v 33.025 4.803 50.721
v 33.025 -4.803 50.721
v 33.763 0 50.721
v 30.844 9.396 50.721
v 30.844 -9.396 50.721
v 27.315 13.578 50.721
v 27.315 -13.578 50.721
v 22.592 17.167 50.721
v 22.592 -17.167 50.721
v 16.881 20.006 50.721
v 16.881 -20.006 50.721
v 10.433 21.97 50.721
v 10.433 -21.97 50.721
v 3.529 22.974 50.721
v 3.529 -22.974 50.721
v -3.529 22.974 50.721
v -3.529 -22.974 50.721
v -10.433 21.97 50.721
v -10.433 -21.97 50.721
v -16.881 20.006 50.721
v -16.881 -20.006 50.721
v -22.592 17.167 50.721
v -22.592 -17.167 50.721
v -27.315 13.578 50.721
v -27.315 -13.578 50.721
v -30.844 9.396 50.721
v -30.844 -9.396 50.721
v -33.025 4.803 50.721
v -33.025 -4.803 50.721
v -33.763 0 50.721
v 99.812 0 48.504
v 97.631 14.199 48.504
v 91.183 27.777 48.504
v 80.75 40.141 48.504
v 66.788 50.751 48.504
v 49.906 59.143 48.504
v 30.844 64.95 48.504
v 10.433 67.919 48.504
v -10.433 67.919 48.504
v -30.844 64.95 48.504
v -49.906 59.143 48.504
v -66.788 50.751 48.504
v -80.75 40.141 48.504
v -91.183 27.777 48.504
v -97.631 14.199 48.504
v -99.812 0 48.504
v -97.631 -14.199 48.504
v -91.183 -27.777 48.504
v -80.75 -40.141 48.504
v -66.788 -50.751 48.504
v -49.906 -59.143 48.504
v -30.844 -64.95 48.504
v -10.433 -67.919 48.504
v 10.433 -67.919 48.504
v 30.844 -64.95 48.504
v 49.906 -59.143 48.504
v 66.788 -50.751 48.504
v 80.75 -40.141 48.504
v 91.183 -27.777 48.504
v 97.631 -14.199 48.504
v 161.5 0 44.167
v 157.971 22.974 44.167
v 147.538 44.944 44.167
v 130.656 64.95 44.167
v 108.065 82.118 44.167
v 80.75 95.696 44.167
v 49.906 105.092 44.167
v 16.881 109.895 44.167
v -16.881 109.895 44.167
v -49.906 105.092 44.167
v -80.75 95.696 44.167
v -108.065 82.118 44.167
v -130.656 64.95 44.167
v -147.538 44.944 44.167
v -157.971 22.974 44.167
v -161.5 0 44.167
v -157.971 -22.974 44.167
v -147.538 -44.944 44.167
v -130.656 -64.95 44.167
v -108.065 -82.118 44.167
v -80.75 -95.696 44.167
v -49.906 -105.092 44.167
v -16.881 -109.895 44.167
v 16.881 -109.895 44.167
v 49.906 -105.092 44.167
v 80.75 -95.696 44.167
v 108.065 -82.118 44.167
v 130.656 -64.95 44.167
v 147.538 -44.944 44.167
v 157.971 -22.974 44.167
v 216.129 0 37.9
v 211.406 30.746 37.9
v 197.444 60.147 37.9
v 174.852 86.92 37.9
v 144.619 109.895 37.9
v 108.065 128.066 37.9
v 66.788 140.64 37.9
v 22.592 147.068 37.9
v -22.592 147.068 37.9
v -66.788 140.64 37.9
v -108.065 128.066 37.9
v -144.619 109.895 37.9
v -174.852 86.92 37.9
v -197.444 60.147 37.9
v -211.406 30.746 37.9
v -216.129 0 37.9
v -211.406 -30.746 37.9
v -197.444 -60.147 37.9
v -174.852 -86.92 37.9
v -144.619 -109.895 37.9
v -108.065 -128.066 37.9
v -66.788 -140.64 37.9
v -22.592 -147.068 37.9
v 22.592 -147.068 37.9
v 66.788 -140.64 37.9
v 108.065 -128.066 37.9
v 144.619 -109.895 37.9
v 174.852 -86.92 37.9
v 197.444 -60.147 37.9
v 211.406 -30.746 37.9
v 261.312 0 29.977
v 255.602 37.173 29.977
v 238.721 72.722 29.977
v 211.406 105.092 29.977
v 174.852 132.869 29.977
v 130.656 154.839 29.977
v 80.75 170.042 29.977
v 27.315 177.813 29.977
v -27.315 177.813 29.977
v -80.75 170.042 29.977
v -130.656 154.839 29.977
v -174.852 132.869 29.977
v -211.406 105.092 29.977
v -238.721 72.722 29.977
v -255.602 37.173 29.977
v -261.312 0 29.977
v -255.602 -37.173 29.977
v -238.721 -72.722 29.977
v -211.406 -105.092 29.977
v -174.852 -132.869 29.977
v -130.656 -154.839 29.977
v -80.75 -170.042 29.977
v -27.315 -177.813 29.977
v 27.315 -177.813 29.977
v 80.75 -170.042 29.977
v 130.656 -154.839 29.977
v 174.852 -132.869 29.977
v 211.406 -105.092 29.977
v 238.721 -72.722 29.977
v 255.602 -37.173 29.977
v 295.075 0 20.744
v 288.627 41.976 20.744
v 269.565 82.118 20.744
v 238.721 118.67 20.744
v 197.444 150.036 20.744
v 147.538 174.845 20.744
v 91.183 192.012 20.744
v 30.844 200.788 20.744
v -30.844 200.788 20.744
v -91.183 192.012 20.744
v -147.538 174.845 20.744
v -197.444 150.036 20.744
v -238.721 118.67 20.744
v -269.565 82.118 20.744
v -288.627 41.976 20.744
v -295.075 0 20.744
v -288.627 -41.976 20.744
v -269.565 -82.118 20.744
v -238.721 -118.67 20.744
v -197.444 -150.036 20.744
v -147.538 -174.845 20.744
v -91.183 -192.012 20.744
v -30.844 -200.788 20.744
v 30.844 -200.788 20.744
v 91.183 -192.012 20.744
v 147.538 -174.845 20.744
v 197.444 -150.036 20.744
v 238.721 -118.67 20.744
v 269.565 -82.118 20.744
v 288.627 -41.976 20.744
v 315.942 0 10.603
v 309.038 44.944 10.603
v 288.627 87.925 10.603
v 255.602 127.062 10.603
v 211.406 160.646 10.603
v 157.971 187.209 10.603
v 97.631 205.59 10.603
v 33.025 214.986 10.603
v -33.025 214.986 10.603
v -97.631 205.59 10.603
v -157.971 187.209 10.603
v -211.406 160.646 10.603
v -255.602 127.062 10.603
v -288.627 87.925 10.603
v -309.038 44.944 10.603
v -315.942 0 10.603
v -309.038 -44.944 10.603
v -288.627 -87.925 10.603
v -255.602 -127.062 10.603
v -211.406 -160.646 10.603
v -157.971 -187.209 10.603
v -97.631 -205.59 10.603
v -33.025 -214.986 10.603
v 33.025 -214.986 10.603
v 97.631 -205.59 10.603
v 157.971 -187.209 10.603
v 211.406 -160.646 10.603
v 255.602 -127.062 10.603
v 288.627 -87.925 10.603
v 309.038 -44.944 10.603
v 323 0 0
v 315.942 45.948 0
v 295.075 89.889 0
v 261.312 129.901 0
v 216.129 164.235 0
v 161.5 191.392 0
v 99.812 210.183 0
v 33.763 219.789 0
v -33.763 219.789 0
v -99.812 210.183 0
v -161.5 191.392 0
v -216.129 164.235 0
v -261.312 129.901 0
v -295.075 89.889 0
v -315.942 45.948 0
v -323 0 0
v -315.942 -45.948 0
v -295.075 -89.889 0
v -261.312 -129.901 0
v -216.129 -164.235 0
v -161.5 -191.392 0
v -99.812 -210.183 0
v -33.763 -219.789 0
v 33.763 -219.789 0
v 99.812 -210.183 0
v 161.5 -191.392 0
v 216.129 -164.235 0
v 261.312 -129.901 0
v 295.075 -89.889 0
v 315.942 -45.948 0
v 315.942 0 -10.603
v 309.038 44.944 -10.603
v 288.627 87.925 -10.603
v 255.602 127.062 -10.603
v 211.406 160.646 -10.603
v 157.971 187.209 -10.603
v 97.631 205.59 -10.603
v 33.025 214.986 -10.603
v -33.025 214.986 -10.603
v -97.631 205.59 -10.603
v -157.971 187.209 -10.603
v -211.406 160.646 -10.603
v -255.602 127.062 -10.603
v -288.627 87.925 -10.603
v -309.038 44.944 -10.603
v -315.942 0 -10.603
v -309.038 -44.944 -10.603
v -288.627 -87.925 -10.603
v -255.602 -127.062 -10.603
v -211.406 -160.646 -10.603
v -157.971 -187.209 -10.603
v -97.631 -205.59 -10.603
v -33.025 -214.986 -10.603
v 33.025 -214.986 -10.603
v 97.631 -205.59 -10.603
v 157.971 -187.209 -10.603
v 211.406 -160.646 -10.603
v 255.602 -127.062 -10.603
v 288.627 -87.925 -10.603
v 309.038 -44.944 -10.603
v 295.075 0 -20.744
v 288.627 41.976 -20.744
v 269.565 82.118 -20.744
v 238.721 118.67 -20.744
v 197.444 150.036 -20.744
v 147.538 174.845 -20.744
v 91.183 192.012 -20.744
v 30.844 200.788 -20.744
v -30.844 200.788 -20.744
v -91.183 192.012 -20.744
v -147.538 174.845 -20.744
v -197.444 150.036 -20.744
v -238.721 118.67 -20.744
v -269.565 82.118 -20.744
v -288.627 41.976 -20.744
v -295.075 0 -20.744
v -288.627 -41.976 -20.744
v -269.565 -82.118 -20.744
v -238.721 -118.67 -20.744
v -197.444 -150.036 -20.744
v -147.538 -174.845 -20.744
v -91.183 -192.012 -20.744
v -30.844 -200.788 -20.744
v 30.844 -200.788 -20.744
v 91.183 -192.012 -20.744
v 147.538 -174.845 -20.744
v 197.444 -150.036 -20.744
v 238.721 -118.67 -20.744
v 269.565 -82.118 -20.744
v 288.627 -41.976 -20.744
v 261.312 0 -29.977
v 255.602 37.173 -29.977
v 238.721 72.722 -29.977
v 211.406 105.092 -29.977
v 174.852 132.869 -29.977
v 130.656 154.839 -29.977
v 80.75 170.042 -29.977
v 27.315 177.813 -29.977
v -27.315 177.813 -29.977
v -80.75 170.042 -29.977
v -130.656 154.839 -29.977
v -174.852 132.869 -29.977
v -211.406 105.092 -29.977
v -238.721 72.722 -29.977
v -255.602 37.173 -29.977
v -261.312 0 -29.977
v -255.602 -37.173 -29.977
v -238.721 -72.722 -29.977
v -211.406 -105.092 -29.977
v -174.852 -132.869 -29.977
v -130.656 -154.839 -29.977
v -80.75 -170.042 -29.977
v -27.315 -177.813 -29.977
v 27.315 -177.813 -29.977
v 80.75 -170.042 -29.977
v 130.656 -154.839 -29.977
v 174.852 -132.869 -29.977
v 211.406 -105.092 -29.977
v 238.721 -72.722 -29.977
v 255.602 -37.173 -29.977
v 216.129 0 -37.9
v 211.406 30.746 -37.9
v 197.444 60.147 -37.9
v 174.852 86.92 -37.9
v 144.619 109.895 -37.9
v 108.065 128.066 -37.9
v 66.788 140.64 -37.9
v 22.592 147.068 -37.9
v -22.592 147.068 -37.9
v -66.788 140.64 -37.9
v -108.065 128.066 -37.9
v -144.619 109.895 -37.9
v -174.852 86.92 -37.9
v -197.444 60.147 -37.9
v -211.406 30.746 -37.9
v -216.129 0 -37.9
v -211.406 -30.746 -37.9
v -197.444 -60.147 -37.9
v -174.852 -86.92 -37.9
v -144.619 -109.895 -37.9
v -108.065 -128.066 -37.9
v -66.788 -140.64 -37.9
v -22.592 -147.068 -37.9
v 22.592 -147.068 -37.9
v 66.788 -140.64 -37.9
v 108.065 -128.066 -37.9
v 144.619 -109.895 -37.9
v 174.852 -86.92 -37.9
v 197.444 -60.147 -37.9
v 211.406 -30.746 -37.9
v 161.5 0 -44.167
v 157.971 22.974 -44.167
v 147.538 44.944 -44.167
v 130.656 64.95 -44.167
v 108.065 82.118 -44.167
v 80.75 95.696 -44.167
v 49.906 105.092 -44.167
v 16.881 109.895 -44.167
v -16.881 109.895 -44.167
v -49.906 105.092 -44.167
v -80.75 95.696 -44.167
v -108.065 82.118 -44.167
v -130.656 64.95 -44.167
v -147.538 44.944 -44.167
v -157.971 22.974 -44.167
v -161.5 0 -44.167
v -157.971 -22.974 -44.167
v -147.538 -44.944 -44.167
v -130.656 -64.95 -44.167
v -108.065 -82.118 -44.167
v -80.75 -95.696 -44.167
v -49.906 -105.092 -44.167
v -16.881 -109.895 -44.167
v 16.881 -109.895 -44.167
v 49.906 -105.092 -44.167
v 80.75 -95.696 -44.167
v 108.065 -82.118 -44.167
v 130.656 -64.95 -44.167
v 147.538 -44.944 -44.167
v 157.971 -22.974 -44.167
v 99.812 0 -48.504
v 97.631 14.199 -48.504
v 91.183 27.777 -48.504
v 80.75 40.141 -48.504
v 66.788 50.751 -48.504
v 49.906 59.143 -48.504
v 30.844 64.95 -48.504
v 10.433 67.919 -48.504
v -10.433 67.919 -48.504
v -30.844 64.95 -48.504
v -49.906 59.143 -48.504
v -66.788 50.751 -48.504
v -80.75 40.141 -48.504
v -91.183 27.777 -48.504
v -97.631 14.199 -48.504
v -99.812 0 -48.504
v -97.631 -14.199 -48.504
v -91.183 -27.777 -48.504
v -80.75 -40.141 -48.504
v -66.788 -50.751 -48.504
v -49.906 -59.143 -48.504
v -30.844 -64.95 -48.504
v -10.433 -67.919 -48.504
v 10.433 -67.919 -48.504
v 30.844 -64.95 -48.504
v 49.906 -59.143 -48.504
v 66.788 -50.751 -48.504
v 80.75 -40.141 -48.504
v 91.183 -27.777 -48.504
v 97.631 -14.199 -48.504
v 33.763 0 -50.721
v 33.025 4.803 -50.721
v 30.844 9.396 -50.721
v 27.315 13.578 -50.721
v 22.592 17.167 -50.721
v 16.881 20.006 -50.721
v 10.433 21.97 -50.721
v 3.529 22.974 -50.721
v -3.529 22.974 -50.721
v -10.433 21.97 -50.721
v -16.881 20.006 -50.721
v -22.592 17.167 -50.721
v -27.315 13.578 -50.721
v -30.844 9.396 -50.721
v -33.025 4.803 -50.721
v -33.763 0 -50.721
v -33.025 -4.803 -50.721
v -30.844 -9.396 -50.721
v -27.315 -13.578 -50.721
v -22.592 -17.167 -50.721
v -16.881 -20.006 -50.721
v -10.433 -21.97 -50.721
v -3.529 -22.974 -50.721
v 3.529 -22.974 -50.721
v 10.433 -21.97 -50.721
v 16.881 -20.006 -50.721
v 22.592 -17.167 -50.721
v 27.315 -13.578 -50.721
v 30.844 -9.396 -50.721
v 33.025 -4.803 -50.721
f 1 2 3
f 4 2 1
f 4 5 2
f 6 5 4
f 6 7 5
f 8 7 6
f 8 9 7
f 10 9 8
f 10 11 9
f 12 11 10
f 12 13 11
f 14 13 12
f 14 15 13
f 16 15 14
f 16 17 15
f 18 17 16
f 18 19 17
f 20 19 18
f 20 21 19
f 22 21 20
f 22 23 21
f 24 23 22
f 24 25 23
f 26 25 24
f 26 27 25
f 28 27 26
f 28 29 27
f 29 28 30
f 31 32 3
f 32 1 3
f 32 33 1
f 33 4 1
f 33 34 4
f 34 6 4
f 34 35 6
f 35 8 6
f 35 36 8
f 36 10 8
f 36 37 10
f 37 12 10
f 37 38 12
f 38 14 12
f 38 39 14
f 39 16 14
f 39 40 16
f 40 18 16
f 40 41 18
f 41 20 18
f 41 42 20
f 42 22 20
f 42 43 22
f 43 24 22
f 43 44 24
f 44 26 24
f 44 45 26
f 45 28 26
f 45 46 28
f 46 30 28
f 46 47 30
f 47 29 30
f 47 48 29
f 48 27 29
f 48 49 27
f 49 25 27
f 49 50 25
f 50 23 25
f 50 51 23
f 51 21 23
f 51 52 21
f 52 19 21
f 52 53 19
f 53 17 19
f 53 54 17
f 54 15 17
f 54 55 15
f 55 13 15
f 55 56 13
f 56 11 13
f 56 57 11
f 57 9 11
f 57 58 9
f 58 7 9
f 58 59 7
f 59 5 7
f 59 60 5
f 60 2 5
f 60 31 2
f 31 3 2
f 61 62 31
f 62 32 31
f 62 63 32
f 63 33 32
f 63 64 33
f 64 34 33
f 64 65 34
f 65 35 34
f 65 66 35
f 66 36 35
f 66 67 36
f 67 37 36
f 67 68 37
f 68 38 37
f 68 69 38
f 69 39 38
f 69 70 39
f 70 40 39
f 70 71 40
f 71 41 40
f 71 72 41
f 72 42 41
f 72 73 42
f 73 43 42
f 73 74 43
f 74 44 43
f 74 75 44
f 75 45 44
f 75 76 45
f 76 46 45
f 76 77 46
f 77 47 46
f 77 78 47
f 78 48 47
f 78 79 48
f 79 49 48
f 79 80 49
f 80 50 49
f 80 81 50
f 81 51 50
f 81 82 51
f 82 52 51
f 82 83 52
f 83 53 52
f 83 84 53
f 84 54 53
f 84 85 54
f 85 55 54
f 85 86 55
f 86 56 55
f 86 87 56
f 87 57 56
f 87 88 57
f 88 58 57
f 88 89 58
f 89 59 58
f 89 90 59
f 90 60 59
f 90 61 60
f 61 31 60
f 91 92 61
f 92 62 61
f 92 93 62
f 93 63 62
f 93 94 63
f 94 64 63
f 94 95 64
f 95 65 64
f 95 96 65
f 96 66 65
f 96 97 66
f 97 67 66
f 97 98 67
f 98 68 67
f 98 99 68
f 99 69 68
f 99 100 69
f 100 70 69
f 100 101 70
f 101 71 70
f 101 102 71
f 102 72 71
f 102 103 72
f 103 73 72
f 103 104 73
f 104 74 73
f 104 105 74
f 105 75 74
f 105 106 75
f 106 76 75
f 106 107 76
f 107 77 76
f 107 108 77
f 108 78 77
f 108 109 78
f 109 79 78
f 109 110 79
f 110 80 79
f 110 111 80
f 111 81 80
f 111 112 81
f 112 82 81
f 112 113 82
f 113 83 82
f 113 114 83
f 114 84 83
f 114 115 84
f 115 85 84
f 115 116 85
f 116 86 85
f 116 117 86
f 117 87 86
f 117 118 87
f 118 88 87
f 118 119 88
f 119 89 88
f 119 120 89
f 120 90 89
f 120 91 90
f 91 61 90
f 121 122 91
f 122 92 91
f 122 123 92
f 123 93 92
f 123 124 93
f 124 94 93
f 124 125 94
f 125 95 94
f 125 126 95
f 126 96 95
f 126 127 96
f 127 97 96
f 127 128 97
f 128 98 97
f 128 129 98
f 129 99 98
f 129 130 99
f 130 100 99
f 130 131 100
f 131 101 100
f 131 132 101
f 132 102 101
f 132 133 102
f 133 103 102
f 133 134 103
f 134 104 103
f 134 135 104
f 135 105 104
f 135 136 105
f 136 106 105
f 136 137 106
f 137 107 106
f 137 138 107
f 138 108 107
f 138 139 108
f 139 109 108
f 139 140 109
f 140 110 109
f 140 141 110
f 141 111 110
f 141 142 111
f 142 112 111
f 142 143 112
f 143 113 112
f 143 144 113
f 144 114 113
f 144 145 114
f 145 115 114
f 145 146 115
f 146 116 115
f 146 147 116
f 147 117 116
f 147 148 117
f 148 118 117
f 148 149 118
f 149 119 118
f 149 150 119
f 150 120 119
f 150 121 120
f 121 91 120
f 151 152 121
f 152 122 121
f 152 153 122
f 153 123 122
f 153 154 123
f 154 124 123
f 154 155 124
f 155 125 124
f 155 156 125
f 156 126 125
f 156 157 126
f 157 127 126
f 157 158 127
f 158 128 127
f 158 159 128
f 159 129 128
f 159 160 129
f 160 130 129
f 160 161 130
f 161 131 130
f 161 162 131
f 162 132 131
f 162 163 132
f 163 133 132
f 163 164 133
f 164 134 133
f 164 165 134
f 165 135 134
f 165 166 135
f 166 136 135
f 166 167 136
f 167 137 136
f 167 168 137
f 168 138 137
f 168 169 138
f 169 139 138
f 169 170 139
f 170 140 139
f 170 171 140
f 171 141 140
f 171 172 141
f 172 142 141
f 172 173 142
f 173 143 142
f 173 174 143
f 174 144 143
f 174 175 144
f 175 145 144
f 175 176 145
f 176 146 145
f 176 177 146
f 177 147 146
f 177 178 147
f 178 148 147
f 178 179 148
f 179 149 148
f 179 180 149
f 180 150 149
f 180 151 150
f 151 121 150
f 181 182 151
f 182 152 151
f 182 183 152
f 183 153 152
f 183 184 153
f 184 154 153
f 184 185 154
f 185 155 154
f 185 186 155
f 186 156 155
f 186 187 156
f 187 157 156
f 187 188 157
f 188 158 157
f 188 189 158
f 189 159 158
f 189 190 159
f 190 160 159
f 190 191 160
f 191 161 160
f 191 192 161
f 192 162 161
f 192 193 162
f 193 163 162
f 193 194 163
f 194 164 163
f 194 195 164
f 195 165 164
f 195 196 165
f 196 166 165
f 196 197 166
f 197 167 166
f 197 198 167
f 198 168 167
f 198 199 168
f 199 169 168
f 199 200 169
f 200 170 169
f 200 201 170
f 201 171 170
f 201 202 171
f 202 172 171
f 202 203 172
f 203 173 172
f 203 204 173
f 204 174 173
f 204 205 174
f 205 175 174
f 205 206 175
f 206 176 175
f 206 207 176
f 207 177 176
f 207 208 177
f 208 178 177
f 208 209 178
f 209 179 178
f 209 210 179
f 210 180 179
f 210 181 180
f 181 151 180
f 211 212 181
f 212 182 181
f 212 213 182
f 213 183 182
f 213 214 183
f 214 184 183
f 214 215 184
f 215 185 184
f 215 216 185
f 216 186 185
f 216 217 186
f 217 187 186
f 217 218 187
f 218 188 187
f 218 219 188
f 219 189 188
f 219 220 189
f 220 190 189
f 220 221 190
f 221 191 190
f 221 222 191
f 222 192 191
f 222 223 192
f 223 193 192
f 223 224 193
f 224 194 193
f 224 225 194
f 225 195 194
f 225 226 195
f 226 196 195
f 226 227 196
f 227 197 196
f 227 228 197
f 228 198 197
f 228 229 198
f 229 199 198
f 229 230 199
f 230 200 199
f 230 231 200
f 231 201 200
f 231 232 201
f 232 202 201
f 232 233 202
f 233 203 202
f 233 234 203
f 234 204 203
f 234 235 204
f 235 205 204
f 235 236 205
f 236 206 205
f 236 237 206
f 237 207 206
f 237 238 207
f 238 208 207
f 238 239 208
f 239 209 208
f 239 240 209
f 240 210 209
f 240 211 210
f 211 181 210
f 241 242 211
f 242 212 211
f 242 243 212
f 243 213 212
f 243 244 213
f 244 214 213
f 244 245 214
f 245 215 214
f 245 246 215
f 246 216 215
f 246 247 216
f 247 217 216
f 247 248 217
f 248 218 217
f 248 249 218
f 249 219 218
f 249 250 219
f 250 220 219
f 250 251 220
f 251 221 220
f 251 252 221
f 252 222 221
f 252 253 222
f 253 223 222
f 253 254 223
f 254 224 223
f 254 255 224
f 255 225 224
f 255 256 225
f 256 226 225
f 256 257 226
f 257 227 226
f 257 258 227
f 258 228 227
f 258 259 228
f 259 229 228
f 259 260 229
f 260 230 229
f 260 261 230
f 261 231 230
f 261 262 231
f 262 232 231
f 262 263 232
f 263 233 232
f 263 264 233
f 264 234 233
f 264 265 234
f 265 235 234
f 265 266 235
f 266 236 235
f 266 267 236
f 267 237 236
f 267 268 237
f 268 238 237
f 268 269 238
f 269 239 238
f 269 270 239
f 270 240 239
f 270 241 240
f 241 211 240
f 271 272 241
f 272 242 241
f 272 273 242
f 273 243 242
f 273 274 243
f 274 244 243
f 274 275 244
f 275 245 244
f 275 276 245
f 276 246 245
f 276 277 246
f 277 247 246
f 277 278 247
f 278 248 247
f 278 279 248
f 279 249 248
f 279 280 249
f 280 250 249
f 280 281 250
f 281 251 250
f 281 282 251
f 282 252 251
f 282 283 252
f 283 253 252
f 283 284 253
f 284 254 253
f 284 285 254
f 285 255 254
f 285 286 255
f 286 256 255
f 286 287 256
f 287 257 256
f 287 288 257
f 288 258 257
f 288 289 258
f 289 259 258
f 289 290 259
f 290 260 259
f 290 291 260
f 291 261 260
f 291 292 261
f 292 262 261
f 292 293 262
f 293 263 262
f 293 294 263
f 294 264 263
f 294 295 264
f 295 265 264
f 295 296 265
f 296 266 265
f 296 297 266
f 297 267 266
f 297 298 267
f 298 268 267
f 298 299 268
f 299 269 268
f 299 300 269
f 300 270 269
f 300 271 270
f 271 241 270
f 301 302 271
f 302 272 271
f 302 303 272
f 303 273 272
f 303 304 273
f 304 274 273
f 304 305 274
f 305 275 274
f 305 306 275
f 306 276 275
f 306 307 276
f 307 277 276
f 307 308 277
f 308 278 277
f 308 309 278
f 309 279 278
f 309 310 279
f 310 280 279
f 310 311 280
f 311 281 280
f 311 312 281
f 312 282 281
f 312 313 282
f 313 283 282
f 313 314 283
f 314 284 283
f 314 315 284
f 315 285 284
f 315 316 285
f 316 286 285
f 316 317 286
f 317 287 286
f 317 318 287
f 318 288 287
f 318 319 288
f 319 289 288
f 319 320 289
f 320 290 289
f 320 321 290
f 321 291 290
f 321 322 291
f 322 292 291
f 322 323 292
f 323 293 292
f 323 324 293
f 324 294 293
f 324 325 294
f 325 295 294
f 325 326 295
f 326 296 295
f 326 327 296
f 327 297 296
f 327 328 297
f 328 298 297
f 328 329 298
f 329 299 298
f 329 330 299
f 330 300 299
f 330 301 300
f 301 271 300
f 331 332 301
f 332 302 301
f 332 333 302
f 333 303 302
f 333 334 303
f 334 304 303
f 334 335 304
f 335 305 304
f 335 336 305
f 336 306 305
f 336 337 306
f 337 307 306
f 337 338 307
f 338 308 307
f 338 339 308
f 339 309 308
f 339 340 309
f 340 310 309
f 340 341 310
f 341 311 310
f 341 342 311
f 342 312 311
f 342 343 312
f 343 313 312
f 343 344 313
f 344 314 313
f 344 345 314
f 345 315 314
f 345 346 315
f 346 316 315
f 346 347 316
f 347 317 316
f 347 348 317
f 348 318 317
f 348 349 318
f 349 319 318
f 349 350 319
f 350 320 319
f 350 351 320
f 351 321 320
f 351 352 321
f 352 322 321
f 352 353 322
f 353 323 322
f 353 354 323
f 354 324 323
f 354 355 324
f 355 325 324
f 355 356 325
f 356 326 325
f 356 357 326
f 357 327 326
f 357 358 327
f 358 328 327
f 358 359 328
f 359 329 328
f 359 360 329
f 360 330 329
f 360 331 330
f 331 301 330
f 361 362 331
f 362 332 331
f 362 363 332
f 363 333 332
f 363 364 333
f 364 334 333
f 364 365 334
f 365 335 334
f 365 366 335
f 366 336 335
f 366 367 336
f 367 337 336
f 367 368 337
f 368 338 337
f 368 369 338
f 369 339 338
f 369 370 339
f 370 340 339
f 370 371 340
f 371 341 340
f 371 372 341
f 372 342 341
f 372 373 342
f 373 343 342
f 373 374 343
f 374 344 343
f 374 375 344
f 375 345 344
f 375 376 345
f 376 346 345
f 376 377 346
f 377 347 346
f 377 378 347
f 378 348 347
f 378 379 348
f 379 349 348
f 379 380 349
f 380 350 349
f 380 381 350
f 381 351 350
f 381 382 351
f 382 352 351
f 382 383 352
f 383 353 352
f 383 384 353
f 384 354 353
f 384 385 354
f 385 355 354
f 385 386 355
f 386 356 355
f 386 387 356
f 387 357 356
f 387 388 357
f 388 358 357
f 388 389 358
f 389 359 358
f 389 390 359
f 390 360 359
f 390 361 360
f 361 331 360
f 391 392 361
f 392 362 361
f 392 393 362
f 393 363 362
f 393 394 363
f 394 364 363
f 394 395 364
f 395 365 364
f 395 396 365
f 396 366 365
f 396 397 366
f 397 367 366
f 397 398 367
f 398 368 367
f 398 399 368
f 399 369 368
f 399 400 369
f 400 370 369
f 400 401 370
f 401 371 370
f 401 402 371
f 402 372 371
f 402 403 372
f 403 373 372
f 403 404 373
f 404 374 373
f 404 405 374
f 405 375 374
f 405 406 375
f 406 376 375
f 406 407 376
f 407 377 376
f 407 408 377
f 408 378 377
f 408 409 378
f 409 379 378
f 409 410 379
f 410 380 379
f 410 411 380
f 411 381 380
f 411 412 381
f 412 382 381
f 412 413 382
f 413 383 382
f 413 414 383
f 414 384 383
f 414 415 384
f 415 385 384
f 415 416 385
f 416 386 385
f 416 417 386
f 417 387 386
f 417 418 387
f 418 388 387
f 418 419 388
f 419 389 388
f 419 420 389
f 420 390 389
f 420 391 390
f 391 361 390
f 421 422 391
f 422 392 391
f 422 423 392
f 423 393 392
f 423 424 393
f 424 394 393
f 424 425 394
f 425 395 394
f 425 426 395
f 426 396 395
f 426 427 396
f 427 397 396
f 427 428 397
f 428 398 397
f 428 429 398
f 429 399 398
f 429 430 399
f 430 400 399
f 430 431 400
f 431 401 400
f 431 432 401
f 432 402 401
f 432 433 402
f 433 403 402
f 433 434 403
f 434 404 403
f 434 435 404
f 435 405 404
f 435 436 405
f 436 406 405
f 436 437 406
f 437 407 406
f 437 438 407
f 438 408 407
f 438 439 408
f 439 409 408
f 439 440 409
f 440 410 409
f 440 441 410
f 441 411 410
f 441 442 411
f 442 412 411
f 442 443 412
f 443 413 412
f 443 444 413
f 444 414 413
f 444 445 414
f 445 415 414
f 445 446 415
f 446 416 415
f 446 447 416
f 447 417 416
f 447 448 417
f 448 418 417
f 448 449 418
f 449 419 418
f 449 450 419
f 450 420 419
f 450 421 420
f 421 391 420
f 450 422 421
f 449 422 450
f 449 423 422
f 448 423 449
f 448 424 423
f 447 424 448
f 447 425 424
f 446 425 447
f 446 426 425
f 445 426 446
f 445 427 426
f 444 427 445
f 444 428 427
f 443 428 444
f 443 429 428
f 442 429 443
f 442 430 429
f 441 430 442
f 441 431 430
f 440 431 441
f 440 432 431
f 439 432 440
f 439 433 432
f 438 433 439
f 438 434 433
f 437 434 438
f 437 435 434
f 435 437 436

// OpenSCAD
// Generated by SolidPython 1.0.1 on 2020-07-29 00:46:54


scale(v = [19, 13, 3]) {
	sphere(r = 17);
}
/***********************************************
*********      SolidPython code:      **********
************************************************
 
# import packages: SolidPython
from solid import *
from solid.utils import *
from itertools import chain, combinations, permutations


class Resize:

    def __init__(self, scad_file):
        self.scad_file = scad_file
        #self.scad_file = import_scad(scad_file)
        # cone/cylinder param:
        self.r1 = 0
        self.r2 = 0
        self.h = 0
        # rectangular prism param:
        self.w = 0
        self.l = 0
        # ellipse param:
        self.r = 0

    # import OpenScad code (file name corresponds to shape)


    # classify shape + parameters
    def assign(self, param1, param2, param3):
        if self.scad_file == 'cone.scad':
            self.r1 = param1
            self.r2 = param2
            self.h = param3
        elif self.scad_file == 'cylinder.scad':
            self.r1 = param1
            self.r2 = param2
            self.h = param3
        elif self.scad_file == 'rectangularPrism.scad':
            self.h = param1
            self.l = param2
            self.w = param3
        else:
            self.r = param1
            self.h = param2

    # resize parameters
    def iterate(self):
        x = range(3, 20, 2)
        i = 1
        if self.scad_file == 'cone.scad':
            tempList = list(permutations(x, 2))
            for temp in tempList:
                param1 = temp[0]
                param2 = temp[1]
                filepath = 'produced_scad_files/' + 'cone' + str(param1) + '_' + str(param2) + '_' + '.scad'
                scad_render_to_file(cylinder(h=param1, r1=param2, r2=0), filepath)

        elif self.scad_file == 'cylinder.scad':
            tempList = list(permutations(x, 3))
            for temp in tempList:
                param1 = temp[0]
                param2 = temp[1]
                filepath = 'produced_scad_files/' + 'cylinder' + str(param1) + '_' + str(param2) + '_' + '.scad'
                scad_render_to_file(cylinder(h=param1, r1=param2, r2=param2), filepath)

        elif self.scad_file == 'rectangularPrism.scad':
            tempList = list(permutations(x, 3))
            for temp in tempList:
                param1 = temp[0]
                param2 = temp[1]
                param3 = temp[2]
                filepath = 'produced_scad_files/' + 'rectangularPrism' + str(param1) + '_' + str(param2) + '_' + str(
                    param3) + '.scad'
                scad_render_to_file(cube(size=(param1, param2, param3)), filepath)

        elif self.scad_file == 'ellipse.scad':
            tempList = list(permutations(x, 4))
            for temp in tempList:
                param1 = temp[0]
                param2 = temp[1]
                param3 = temp[2]
                param4 = temp[3]
                filepath = 'produced_scad_files/' + 'ellipse' + str(param1) + '_' + str(param2) + '_' + str(param3) + '_' + str(param4) + '.scad'
                scad_render_to_file(scale([param1, param2, param3])(sphere(r=param4)), filepath)

    def render_to_scadfile(self):
        scad_render_to_file(scad, 'example.scad') 
 
************************************************/
